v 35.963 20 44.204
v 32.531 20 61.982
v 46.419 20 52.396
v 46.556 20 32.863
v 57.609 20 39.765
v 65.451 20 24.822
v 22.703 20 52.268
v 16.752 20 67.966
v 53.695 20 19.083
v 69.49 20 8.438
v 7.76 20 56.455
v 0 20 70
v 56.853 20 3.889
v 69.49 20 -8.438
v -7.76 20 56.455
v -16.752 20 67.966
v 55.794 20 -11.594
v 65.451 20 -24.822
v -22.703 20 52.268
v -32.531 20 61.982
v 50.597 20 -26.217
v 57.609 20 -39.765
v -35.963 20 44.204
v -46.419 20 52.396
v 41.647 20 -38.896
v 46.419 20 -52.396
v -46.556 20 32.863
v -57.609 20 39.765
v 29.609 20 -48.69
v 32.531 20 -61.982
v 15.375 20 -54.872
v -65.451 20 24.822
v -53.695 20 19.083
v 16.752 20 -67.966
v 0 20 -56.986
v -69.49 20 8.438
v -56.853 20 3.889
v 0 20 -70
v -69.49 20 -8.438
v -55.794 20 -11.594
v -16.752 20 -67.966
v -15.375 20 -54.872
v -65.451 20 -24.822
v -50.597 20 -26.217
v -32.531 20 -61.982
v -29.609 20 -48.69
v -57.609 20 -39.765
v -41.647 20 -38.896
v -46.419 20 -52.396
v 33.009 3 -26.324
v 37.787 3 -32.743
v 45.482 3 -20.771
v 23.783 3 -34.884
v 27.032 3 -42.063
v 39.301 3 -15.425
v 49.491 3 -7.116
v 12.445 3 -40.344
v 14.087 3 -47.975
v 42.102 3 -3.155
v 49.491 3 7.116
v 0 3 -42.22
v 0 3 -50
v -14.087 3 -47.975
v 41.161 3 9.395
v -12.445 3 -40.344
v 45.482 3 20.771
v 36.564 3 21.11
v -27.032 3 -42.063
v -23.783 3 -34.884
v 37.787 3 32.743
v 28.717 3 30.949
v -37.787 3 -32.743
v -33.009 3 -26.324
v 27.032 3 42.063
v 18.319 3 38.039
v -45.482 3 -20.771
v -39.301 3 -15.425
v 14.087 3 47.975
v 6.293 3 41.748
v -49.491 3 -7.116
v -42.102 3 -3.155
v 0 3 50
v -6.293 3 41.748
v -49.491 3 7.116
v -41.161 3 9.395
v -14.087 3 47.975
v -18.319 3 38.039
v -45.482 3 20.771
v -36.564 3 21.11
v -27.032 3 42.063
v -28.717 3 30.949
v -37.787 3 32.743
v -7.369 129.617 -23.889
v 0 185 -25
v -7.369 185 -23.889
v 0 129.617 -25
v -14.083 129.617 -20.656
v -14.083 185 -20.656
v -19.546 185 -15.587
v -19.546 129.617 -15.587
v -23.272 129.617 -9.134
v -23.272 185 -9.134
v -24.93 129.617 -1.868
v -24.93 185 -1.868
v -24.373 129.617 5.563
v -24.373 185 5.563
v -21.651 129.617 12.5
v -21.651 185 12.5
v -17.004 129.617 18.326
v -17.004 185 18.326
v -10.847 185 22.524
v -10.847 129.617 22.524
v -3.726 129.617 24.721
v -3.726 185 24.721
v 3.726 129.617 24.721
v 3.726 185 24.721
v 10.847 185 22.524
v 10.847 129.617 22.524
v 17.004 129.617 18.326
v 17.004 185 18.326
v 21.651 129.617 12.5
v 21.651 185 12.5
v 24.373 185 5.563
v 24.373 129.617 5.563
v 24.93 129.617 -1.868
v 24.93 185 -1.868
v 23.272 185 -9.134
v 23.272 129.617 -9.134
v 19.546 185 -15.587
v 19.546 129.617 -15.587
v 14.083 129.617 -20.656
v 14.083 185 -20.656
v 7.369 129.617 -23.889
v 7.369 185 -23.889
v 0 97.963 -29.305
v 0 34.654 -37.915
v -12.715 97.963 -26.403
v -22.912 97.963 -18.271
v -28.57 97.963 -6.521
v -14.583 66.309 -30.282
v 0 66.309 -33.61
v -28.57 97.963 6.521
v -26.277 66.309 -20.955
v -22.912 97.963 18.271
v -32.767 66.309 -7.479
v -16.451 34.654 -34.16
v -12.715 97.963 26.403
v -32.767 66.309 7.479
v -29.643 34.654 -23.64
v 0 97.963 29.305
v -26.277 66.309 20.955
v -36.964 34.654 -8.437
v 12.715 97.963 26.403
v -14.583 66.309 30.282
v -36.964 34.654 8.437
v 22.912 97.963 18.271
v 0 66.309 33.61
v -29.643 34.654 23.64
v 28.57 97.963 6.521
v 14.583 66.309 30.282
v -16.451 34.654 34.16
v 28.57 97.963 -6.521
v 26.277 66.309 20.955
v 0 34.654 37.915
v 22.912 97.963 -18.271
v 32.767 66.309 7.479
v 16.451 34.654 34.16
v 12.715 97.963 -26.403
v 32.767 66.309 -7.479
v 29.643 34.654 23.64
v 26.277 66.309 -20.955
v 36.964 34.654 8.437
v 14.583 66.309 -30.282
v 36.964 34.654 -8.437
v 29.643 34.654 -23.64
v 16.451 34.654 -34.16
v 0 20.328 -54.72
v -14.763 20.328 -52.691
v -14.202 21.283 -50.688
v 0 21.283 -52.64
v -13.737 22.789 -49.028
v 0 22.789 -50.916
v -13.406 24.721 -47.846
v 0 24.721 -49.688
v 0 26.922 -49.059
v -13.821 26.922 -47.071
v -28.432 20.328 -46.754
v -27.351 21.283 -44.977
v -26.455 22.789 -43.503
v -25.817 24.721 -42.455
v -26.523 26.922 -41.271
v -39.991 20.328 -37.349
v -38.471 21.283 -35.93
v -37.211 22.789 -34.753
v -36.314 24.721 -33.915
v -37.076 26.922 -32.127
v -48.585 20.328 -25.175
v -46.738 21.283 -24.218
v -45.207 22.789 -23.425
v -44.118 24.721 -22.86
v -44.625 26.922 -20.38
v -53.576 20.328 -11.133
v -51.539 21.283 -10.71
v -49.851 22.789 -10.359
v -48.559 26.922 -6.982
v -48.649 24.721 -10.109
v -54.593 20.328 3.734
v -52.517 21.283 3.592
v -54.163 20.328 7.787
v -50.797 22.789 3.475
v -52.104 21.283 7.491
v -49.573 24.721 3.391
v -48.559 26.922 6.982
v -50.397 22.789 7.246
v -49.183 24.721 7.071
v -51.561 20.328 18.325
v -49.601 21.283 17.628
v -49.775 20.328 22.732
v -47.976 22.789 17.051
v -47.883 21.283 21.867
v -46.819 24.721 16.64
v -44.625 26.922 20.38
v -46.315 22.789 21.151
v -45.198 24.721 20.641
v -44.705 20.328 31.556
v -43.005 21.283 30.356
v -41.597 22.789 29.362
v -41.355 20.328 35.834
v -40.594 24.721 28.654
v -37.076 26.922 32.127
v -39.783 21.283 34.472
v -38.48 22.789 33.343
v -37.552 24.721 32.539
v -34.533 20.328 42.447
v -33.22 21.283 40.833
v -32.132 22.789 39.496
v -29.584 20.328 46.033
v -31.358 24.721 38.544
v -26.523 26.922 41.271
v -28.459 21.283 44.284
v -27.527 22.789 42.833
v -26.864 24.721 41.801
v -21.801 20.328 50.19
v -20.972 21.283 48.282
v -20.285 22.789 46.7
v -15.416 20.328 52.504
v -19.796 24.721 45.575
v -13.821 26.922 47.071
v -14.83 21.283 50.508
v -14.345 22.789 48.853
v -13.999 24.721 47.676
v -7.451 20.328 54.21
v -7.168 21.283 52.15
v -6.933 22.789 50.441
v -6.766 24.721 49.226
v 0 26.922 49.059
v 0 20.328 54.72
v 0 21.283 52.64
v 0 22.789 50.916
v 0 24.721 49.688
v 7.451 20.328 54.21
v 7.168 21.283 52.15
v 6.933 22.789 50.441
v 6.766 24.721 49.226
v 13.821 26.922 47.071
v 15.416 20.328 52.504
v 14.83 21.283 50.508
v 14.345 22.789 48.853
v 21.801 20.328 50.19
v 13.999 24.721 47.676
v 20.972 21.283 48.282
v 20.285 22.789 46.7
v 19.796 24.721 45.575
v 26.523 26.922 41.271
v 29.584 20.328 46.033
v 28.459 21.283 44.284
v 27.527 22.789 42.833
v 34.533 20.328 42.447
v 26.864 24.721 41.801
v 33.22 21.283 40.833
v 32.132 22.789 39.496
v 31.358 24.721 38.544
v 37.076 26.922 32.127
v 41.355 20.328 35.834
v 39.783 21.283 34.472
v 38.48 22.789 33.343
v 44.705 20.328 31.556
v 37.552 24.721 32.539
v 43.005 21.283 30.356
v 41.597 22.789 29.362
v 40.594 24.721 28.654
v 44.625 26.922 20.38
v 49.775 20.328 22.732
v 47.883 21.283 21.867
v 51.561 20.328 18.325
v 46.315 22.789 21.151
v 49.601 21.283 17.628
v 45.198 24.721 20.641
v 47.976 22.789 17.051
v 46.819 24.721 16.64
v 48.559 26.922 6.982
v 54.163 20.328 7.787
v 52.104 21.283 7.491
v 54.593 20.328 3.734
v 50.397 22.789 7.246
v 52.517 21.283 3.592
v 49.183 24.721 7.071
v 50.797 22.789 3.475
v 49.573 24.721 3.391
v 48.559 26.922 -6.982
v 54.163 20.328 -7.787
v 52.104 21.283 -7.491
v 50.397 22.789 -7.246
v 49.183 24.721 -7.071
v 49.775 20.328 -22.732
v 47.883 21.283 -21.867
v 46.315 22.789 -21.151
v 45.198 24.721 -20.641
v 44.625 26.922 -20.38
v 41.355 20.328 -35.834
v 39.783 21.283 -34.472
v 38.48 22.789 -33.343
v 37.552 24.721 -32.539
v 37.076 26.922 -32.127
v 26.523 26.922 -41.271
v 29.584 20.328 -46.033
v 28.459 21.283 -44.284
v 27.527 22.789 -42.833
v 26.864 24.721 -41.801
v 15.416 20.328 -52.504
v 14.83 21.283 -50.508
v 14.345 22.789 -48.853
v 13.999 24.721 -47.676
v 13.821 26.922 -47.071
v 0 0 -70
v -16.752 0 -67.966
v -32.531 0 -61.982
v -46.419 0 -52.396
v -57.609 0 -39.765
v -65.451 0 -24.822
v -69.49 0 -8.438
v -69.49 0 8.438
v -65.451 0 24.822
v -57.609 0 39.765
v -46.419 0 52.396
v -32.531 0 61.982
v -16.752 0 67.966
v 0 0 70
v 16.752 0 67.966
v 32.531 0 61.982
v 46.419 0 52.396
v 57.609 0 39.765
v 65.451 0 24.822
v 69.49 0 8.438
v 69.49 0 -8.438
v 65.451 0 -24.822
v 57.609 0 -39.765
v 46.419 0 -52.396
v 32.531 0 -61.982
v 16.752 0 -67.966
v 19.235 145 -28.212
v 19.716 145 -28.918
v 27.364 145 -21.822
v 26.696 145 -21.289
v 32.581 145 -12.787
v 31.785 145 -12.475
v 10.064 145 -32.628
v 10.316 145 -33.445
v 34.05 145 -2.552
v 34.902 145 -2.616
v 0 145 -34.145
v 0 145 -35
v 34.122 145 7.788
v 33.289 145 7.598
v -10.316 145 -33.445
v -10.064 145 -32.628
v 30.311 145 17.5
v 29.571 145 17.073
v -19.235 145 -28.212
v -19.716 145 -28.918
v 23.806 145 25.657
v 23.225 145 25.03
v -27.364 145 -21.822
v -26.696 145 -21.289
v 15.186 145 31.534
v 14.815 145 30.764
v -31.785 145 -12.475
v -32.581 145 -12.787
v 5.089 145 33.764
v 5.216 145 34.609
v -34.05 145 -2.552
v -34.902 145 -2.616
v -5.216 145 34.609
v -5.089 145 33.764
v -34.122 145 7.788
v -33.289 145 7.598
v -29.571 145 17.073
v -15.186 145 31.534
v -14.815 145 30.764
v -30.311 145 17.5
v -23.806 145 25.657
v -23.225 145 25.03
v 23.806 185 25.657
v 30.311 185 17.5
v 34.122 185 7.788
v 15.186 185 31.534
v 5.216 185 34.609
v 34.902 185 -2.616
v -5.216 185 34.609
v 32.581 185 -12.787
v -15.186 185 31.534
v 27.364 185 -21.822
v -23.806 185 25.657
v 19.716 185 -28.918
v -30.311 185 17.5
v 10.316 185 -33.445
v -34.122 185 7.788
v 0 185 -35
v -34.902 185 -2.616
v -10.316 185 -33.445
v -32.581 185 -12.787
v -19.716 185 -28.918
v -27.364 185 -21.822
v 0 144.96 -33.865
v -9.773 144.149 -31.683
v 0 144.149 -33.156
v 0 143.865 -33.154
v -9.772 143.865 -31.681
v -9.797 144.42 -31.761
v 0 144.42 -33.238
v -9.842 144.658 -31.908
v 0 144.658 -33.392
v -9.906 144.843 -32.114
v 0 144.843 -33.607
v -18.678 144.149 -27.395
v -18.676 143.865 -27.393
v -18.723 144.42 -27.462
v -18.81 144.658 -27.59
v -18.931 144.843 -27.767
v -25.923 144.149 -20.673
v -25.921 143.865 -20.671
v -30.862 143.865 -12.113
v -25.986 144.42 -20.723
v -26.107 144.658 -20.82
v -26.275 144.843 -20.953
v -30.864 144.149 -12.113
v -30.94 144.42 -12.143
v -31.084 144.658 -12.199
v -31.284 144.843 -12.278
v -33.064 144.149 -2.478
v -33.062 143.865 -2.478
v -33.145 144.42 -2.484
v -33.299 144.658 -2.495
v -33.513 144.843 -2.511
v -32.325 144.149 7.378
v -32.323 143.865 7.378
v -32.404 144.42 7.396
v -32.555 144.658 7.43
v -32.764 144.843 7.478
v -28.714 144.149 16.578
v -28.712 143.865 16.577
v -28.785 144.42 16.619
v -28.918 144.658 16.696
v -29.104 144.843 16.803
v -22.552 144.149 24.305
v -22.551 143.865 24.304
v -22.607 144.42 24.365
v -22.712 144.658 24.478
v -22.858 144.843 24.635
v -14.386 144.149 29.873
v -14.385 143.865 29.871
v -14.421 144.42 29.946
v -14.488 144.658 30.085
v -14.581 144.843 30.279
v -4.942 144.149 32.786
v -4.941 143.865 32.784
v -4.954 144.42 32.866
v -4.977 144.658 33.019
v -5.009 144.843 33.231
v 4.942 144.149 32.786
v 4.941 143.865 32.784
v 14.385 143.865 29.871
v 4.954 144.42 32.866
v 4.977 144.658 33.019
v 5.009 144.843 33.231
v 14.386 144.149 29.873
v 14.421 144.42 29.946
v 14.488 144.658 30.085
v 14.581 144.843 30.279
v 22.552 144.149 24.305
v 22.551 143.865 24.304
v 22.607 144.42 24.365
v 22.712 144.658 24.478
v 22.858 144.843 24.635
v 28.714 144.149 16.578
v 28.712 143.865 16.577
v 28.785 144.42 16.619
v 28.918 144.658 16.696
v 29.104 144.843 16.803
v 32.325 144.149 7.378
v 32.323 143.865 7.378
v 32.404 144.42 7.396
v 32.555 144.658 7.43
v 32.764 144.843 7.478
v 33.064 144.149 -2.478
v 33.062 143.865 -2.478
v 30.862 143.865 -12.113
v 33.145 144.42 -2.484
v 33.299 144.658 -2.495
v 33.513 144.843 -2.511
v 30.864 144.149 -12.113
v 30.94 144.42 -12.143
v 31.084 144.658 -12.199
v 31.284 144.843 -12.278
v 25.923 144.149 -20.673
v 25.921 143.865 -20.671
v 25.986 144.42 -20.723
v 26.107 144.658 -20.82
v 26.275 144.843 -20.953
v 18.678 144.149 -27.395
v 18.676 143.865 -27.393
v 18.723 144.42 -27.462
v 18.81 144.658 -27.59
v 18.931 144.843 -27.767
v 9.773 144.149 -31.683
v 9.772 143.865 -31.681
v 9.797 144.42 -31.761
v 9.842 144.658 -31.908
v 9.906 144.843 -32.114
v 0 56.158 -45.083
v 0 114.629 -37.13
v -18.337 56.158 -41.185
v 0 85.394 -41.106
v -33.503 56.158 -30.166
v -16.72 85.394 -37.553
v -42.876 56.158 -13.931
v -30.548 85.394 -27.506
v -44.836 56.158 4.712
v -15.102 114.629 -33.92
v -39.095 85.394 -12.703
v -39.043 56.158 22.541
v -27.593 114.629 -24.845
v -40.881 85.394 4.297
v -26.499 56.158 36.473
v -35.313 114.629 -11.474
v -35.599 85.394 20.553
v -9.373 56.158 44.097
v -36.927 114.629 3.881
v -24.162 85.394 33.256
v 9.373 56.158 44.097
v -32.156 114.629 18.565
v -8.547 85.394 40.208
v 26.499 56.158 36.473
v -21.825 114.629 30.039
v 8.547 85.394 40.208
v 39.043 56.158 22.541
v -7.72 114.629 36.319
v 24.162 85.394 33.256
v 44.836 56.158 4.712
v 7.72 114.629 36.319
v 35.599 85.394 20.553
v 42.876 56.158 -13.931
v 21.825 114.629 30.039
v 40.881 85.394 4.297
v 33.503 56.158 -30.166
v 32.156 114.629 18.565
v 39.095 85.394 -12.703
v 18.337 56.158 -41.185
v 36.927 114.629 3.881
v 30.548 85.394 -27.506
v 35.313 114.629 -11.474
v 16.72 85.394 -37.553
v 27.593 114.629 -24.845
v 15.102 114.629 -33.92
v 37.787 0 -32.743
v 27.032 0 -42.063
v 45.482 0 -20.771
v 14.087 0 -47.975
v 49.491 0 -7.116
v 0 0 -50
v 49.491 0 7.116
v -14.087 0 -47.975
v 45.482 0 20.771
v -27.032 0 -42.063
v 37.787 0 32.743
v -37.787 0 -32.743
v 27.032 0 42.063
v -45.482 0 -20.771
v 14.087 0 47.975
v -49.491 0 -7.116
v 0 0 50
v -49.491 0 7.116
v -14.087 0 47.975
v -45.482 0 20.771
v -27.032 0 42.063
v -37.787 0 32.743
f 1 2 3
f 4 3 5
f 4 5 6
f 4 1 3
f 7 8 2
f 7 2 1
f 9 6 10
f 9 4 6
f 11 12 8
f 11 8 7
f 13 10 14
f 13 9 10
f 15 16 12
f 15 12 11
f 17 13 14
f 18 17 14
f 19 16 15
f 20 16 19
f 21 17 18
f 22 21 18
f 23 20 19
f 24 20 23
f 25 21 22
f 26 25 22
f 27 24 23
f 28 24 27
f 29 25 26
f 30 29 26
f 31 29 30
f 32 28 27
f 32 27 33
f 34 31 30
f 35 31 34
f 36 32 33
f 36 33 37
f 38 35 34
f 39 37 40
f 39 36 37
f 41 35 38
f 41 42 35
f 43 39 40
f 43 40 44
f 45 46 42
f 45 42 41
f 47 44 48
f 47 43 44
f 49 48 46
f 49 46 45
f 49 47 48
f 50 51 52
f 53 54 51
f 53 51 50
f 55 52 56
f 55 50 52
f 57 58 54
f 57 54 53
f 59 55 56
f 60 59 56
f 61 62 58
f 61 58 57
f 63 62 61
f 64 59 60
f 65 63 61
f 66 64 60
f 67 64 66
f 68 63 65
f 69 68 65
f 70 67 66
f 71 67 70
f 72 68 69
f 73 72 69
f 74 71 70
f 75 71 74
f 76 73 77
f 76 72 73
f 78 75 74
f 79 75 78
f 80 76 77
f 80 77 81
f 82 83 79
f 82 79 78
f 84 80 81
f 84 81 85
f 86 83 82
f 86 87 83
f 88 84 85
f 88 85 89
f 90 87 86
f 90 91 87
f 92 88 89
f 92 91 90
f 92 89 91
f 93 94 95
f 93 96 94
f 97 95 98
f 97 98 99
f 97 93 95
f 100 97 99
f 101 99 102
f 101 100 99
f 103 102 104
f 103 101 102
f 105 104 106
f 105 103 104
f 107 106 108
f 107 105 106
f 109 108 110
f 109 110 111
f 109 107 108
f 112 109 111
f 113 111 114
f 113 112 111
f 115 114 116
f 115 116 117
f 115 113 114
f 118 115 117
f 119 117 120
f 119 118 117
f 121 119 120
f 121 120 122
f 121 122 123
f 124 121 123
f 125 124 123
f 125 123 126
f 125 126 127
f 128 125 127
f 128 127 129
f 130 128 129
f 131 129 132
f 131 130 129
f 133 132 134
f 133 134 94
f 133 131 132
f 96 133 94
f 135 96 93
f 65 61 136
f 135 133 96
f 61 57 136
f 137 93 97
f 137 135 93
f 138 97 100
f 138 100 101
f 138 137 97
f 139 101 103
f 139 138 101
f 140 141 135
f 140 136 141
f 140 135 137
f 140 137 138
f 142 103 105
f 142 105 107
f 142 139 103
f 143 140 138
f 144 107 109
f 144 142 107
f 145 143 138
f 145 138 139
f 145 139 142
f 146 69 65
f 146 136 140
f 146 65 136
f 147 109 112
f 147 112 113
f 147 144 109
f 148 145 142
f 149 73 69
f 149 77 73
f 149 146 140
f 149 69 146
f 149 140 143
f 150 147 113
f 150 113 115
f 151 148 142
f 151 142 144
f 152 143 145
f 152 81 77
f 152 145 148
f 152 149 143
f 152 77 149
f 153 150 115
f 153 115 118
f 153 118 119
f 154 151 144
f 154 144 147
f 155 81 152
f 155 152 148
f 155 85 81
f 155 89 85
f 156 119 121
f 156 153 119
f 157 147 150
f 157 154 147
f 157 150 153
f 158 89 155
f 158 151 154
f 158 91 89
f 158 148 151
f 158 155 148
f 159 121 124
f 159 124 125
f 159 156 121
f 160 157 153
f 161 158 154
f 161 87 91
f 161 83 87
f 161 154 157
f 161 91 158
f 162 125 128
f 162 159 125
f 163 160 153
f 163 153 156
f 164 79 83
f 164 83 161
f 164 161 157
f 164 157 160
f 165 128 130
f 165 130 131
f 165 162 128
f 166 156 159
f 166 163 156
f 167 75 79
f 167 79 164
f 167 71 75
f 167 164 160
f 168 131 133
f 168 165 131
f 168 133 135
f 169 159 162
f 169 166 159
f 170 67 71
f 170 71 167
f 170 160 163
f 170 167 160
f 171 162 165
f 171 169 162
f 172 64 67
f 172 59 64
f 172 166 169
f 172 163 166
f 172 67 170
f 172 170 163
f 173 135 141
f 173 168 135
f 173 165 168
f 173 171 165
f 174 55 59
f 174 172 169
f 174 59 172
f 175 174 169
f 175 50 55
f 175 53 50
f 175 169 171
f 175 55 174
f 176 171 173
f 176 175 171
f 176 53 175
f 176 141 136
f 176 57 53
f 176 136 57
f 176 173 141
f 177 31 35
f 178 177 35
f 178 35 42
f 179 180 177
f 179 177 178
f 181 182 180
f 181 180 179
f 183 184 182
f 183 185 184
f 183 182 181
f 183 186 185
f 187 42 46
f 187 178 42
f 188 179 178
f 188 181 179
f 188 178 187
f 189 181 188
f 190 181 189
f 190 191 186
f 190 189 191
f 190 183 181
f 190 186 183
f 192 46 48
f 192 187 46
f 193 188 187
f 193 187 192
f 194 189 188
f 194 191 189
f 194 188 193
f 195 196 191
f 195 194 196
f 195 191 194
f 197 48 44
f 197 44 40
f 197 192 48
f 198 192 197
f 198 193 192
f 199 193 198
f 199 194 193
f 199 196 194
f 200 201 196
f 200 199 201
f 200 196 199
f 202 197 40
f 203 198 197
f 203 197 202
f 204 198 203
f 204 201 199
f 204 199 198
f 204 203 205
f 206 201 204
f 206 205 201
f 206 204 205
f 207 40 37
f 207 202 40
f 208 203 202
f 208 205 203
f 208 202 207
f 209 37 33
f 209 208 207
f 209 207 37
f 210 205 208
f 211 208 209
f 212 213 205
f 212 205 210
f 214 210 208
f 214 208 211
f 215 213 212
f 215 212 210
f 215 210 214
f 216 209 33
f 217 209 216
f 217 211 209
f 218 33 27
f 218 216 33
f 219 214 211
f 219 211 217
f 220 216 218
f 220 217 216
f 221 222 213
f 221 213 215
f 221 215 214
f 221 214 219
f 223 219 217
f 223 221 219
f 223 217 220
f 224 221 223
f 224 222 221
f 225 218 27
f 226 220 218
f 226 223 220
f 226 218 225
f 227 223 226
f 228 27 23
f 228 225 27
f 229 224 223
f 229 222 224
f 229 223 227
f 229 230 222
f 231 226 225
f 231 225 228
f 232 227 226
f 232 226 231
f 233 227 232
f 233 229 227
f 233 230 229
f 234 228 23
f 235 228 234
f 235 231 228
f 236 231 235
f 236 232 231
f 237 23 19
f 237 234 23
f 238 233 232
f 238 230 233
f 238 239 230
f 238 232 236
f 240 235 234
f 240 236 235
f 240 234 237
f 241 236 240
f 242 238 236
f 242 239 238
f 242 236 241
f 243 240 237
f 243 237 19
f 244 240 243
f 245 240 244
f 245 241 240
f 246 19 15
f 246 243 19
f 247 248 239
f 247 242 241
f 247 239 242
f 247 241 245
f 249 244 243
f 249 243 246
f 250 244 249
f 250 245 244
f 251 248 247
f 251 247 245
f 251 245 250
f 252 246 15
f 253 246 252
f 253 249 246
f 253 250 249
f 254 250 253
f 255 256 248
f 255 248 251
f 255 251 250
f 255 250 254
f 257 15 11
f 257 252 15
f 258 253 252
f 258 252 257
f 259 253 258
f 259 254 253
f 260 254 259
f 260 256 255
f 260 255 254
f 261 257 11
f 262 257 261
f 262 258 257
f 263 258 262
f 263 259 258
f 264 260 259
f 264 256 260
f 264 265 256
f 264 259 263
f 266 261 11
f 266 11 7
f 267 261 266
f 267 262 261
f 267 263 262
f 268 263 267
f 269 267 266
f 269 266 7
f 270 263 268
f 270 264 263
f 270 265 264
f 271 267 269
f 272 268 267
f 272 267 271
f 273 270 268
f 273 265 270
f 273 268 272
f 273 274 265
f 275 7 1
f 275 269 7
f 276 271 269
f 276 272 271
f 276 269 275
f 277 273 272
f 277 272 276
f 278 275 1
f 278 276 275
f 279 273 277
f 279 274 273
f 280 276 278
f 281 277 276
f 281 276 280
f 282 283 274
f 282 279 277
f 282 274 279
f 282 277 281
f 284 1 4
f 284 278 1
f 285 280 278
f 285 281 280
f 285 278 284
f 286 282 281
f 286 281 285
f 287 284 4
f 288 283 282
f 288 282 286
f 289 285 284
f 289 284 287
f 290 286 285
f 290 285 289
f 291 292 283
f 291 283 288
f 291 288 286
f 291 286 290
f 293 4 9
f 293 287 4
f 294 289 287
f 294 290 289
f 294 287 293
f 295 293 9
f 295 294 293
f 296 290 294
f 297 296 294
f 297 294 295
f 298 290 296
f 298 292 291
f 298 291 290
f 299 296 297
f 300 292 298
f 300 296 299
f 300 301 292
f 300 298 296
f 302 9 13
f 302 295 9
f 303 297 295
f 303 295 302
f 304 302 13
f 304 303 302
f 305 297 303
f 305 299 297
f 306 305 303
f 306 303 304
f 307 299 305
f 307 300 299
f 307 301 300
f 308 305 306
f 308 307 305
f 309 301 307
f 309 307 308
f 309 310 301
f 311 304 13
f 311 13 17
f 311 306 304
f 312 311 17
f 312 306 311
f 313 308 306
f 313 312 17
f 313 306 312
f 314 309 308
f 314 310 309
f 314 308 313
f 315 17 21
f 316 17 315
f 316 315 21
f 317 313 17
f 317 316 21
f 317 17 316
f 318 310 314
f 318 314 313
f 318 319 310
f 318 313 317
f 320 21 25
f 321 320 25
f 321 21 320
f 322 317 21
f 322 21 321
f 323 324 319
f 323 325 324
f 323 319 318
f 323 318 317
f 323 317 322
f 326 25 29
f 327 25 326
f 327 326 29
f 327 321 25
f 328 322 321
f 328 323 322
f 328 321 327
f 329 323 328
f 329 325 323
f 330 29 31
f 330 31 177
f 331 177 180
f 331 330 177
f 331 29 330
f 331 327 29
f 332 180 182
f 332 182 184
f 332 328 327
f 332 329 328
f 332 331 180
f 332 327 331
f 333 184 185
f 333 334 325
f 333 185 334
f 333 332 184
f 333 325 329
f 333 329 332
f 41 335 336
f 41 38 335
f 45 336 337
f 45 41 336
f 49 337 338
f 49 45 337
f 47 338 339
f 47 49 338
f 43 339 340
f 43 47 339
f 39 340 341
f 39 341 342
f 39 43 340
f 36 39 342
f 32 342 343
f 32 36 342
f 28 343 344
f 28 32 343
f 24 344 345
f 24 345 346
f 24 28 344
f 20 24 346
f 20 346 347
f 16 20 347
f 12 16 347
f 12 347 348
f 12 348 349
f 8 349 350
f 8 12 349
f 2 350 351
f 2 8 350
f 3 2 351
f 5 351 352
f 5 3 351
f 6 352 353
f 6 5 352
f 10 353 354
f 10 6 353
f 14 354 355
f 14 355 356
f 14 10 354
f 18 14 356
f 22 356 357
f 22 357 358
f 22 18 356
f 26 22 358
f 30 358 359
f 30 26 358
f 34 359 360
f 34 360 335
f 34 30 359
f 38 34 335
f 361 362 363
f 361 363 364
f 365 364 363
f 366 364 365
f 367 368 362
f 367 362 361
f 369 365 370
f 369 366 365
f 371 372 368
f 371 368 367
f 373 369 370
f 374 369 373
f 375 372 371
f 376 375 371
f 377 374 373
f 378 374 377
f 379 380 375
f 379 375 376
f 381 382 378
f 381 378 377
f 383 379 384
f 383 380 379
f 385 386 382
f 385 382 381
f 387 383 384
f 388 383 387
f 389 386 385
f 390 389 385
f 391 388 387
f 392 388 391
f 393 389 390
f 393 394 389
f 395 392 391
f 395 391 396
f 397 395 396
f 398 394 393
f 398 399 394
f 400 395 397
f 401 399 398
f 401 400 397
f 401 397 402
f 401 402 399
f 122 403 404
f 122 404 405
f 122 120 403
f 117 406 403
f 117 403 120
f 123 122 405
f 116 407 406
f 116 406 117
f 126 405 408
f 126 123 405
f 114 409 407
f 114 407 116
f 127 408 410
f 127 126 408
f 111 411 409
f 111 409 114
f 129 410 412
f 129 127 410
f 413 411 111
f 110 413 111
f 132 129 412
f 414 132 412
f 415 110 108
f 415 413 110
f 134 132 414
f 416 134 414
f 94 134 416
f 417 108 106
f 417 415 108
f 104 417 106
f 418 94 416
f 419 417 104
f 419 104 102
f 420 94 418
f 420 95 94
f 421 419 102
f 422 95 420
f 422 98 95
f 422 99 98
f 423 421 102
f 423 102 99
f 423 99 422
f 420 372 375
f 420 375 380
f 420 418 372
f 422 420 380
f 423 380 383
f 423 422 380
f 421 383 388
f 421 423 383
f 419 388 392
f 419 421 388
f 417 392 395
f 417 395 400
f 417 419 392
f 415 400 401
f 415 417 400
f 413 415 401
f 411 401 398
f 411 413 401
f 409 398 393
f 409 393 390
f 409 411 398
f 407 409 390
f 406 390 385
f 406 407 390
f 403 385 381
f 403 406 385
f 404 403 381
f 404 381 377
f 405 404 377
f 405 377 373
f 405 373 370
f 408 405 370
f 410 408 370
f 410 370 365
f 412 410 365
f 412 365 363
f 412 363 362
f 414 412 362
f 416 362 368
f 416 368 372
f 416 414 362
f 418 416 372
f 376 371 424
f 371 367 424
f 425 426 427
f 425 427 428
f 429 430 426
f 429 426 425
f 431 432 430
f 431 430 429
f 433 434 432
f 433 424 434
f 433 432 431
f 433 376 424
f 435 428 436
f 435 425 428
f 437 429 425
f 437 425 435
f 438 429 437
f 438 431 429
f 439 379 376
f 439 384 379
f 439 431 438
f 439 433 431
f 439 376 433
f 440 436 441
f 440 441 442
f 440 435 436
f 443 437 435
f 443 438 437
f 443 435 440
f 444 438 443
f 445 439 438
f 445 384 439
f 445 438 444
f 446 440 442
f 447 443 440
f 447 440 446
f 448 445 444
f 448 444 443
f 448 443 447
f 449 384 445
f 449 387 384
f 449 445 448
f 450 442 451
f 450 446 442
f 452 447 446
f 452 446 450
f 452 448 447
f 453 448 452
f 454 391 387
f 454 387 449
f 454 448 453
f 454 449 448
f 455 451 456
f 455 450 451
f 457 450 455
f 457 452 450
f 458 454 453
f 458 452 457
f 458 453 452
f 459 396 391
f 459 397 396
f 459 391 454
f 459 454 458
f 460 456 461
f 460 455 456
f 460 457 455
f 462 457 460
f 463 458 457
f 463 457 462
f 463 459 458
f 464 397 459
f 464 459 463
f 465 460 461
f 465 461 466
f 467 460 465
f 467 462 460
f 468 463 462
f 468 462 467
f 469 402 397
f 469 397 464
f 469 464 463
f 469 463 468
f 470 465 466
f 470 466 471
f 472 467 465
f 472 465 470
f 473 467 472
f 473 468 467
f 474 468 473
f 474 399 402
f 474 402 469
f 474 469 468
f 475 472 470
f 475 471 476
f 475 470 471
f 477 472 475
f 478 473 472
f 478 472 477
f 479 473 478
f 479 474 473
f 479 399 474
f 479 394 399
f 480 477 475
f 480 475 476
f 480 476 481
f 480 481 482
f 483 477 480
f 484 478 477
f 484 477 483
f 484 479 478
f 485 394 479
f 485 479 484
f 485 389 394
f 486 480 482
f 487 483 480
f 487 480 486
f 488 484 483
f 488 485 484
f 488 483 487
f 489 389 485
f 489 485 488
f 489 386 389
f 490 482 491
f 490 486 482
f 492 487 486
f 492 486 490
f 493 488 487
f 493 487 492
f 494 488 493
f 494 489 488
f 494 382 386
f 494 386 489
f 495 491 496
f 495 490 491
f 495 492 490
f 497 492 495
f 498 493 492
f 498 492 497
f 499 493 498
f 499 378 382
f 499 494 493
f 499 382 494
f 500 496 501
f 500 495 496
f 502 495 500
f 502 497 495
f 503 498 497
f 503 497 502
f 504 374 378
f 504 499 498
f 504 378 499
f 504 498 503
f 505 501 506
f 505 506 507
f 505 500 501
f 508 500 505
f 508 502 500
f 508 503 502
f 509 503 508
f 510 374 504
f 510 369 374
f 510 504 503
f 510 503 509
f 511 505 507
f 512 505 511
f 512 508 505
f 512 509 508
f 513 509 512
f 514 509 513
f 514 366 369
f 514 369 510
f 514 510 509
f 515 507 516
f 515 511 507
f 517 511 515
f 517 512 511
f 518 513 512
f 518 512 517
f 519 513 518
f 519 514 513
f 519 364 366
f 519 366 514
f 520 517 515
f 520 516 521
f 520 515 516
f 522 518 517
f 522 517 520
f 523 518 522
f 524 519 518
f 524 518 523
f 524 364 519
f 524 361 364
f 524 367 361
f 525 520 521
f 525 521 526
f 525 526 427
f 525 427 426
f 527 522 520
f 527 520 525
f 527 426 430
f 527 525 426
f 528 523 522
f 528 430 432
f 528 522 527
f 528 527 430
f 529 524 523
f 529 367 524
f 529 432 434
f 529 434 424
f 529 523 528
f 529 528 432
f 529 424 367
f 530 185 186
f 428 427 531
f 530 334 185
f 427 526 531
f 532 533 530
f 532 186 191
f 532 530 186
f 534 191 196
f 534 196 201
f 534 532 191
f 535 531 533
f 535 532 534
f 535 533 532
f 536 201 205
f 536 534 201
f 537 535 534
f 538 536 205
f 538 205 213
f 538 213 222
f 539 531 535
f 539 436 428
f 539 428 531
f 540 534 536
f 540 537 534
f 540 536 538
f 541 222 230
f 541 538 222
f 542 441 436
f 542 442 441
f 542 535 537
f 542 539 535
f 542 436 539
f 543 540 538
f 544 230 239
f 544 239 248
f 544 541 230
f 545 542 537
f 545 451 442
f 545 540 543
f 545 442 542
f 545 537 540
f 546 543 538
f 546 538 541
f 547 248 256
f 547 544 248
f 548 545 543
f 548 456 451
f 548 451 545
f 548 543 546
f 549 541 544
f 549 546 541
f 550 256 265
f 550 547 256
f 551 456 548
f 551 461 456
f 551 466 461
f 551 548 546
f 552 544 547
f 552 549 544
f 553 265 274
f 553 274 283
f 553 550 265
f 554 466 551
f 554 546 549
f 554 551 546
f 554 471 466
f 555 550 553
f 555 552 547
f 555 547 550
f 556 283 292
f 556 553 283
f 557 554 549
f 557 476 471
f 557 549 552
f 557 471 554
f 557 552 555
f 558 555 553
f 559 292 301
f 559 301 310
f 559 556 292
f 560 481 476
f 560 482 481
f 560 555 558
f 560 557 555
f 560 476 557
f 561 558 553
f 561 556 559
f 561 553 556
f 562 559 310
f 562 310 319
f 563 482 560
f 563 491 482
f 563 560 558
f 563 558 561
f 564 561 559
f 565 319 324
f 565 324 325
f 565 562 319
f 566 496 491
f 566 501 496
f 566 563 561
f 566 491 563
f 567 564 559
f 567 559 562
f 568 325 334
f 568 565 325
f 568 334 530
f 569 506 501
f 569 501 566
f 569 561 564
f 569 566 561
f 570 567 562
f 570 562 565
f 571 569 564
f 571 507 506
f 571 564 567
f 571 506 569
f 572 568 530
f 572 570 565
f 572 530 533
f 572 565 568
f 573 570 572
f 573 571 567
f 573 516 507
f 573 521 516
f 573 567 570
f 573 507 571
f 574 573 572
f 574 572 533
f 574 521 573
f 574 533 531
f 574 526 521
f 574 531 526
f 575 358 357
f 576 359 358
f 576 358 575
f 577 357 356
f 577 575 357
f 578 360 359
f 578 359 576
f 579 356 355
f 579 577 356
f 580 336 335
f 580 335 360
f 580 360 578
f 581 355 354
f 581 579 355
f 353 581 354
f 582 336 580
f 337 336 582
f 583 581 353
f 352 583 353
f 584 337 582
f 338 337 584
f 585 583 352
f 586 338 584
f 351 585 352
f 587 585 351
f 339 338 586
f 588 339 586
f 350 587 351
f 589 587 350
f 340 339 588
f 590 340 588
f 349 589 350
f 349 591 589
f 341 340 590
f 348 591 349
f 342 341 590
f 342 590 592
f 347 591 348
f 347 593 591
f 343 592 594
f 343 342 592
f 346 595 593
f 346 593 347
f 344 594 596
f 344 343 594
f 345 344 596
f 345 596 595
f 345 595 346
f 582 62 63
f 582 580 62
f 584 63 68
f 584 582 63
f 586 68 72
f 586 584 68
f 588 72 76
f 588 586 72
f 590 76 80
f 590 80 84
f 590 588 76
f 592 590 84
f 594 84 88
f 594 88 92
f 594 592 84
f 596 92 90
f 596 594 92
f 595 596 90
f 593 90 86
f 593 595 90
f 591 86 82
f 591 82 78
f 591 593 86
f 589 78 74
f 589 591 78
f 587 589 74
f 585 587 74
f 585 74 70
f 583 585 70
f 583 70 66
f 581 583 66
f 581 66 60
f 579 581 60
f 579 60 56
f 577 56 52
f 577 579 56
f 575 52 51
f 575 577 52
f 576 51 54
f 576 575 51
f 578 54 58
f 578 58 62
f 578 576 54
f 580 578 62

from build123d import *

# Parameters (mm, degrees)
FILLET1_R = 8
FILLET2_R = 1


with BuildPart() as part:
    # Sketch2 → Revolve2 (revolve)
    with BuildSketch(Plane.XY, mode=Mode.PRIVATE) as revolve2_sk:
        Polygon((50, 0), (70, 0), (70, 20), (50, 20), (33, 145), (35, 145), (35, 185), (25, 185), (25, 129.61723322), (42.219943718, 3), (50, 3), align=None)
    revolve(revolve2_sk.sketch.rotate(Axis((0, 0, 0), (0, 1, 0)), 90), axis=Axis((0, 0, 0), (0, 1, 0)))

    # Fillet1
    fillet1_edges = [part.edges().sort_by_distance(p)[0] for p in [
        (0, 20, 50),
    ]]
    fillet(fillet1_edges, radius=FILLET1_R)

    # Fillet2
    fillet2_edges = [part.edges().sort_by_distance(p)[0] for p in [
        (0, 145, 33),
    ]]
    fillet(fillet2_edges, radius=FILLET2_R)


solid = part.part
